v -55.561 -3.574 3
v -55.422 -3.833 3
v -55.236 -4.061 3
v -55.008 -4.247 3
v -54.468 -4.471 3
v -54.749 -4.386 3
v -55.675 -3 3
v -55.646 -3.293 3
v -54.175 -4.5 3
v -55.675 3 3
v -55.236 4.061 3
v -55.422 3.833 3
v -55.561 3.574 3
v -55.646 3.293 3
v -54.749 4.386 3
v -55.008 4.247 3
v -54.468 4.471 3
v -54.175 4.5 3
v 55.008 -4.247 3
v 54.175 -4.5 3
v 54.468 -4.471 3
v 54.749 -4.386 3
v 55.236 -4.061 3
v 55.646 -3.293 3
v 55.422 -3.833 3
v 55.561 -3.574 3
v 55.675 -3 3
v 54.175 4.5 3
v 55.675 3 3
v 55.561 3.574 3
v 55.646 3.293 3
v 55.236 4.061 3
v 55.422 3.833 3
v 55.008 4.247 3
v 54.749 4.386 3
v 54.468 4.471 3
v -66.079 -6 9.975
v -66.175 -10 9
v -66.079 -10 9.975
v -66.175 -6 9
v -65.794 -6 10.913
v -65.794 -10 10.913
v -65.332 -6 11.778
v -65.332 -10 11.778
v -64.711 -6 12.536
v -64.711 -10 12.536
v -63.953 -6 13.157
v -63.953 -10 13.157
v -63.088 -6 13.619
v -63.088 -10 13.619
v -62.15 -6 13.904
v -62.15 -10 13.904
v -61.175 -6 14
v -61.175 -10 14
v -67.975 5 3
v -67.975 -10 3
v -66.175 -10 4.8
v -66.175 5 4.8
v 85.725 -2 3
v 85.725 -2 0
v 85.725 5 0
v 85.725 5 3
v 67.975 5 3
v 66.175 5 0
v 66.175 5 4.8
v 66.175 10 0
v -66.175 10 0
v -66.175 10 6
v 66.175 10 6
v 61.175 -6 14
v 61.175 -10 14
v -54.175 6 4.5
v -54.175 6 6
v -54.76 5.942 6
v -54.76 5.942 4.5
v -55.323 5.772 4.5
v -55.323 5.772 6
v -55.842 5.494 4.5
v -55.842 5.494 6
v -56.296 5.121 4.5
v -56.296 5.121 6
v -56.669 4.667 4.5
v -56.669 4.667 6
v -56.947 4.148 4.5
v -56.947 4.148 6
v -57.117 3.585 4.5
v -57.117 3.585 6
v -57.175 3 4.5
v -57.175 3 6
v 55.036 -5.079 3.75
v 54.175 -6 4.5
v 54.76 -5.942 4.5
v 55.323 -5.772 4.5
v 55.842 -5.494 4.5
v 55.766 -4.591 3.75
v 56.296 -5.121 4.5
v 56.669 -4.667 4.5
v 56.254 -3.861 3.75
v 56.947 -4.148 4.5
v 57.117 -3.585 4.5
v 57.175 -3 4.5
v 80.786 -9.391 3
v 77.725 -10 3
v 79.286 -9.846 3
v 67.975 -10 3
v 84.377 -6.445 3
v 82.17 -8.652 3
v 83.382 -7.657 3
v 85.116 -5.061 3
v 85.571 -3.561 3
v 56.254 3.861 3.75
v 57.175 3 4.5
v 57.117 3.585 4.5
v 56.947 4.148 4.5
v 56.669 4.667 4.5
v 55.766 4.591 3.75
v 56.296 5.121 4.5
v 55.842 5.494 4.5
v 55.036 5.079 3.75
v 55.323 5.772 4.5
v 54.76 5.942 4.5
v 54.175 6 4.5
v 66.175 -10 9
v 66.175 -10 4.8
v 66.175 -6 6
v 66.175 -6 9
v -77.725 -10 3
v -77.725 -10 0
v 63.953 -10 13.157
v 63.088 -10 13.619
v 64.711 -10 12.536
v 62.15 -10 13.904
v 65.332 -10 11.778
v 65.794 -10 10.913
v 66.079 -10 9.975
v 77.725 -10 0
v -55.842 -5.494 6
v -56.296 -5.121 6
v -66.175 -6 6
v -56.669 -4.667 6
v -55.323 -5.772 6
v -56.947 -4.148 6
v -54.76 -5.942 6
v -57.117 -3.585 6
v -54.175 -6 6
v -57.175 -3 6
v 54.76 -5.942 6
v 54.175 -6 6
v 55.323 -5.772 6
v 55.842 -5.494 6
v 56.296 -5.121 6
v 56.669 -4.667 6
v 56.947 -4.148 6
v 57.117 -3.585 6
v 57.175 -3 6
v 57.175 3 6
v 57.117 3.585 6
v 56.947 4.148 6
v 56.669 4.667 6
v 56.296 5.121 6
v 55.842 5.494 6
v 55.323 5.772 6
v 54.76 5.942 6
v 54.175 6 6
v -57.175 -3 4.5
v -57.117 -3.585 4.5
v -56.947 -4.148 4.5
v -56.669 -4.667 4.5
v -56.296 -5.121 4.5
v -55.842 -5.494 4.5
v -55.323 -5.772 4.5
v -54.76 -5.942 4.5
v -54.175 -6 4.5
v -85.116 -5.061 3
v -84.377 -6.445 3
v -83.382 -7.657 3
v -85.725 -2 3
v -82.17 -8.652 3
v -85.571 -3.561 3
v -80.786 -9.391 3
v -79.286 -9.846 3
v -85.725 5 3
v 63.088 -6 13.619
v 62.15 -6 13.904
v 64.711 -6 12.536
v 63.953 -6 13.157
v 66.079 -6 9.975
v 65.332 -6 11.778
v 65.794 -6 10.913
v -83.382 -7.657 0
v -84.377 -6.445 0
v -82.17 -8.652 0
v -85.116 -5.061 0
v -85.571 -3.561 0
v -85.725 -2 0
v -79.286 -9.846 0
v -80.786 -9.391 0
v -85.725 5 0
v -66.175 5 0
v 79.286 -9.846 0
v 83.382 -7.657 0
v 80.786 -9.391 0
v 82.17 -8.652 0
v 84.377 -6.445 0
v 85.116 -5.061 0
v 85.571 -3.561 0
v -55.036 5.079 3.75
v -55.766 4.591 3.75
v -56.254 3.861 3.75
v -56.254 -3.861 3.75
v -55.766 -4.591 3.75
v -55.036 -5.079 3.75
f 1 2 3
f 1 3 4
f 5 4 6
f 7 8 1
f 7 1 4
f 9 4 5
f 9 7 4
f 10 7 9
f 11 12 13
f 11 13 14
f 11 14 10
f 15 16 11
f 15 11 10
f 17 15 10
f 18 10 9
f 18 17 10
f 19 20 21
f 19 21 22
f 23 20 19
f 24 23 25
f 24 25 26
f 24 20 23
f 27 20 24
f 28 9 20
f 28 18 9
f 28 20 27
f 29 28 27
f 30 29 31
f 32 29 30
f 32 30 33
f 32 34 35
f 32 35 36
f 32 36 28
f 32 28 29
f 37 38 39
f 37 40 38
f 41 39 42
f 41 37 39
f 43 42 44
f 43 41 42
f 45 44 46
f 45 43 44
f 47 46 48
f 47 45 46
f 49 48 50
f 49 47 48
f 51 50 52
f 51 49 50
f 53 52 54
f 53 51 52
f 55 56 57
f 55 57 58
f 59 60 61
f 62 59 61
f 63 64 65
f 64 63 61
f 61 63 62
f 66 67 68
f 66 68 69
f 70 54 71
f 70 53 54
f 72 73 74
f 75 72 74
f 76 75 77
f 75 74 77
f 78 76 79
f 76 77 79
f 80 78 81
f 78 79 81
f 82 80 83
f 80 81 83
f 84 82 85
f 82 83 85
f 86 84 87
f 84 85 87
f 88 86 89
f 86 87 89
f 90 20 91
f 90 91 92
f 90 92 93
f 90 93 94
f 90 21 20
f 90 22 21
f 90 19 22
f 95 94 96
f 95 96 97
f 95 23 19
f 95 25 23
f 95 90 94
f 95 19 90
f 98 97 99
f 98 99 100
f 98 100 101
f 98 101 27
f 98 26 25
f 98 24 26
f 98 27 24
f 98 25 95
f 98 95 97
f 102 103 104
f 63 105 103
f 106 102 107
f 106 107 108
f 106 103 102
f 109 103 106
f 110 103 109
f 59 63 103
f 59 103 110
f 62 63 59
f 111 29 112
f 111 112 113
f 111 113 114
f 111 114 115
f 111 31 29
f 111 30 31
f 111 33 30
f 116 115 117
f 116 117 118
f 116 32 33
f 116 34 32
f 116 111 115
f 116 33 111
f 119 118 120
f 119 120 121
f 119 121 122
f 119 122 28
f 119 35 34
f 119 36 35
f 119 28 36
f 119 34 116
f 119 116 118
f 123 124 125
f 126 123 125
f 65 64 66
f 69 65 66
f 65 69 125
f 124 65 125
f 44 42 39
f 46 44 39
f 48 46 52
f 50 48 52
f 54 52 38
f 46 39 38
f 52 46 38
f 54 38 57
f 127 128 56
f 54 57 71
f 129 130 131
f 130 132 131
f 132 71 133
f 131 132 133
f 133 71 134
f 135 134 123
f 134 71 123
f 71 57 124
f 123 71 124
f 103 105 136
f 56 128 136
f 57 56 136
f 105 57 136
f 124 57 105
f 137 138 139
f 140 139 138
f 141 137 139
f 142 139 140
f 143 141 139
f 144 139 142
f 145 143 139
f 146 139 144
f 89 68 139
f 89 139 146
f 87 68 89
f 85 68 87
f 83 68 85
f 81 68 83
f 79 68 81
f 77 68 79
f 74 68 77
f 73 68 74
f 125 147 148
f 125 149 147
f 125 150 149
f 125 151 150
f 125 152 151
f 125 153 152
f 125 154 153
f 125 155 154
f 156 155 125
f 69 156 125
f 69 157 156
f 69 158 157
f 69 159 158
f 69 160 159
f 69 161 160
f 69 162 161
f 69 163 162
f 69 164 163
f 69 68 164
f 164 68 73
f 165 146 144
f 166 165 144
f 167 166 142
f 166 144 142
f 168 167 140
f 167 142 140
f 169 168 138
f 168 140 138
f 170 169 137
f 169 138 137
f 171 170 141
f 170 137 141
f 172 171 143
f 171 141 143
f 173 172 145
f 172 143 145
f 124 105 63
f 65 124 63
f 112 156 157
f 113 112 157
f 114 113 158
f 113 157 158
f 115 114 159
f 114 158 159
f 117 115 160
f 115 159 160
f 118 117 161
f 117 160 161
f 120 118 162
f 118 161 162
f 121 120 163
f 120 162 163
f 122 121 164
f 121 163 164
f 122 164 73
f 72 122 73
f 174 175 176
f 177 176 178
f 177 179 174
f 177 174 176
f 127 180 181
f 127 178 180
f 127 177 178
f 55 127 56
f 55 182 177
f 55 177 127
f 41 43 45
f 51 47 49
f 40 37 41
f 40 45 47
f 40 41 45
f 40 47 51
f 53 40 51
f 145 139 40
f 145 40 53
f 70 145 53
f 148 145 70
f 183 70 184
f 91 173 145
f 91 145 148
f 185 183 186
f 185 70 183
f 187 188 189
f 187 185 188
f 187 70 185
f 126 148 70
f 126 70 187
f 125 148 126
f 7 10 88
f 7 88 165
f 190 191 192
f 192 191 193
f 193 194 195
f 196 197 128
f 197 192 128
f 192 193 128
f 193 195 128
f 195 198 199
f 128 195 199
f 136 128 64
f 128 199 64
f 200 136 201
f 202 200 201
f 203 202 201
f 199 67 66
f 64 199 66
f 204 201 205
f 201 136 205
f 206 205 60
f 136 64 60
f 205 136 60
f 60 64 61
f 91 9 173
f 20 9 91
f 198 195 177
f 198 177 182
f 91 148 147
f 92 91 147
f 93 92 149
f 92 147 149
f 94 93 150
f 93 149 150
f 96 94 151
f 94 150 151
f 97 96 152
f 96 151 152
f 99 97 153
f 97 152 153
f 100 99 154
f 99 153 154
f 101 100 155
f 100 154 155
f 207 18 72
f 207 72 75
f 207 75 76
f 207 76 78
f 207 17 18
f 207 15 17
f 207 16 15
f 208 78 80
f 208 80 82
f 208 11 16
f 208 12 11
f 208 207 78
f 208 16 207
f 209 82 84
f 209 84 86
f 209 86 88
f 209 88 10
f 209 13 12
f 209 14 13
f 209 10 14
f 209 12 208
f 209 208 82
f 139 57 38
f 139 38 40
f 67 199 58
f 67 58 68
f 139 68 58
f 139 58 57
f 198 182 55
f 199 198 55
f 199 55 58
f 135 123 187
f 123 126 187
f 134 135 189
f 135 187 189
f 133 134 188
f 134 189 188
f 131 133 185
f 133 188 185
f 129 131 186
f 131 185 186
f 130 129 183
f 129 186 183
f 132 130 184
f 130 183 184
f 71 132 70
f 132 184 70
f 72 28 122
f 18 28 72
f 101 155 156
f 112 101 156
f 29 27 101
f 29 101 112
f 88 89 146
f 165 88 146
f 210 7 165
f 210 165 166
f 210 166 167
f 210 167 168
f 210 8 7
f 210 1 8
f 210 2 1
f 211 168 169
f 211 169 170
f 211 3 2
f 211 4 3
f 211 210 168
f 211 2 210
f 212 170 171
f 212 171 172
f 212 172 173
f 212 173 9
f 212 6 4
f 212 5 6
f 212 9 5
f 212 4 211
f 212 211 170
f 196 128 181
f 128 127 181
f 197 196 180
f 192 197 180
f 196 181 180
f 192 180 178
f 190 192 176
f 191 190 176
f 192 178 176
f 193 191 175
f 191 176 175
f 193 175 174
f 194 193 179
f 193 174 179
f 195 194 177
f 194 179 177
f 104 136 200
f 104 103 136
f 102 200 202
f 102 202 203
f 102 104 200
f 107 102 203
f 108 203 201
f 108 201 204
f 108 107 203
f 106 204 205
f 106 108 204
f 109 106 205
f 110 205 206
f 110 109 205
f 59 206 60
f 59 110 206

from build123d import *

# Parameters (mm, degrees)
SKETCH1_W           = 171.45
SKETCH1_H           = 20
BOSS_EXTRUDE1_DEPTH = 6
SKETCH2_W           = 19.55
SKETCH2_H           = 15
CUT_EXTRUDE1_DEPTH  = 3
SKETCH3_W           = 19.55
SKETCH3_H           = 5
CUT_EXTRUDE2_DEPTH  = 13
CHAMFER1_SIZE       = 1.8
SKETCH4_W           = 132.35
SKETCH4_H           = 4
BOSS_EXTRUDE2_DEPTH = 8
CUT_EXTRUDE3_DEPTH  = 3
CHAMFER2_SIZE       = 1.5
FILLET1_R           = 8
FILLET2_R           = 5


with BuildPart() as part:
    # Sketch1 → Boss-Extrude1 (new body)
    with BuildSketch(Plane.XY):
        Rectangle(SKETCH1_W, SKETCH1_H)
    extrude(amount=BOSS_EXTRUDE1_DEPTH)

    # Sketch2 → Cut-Extrude1 (cut)
    with BuildSketch(Plane.XY.offset(6)):
        with Locations((-75.95, -2.5)):
            Rectangle(SKETCH2_W, SKETCH2_H)
        with Locations((75.95, -2.5)):
            Rectangle(SKETCH2_W, SKETCH2_H)
    extrude(amount=-CUT_EXTRUDE1_DEPTH, mode=Mode.SUBTRACT)

    # Sketch3 → Cut-Extrude2 (cut)
    with BuildSketch(Plane.XY.offset(6)):
        with Locations((-75.95, 7.5)):
            Rectangle(SKETCH3_W, SKETCH3_H)
        with Locations((75.95, 7.5)):
            Rectangle(SKETCH3_W, SKETCH3_H)
    extrude(amount=-CUT_EXTRUDE2_DEPTH, mode=Mode.SUBTRACT)

    # Chamfer1
    chamfer1_edges = [part.edges().sort_by_distance(p)[0] for p in [
        (-66.175, -2.5, 3),
        (66.175, -2.5, 3),
    ]]
    chamfer(chamfer1_edges, length=CHAMFER1_SIZE)

    # Sketch4 → Boss-Extrude2 (add)
    with BuildSketch(Plane.XY.offset(6)):
        with Locations((0, -8)):
            Rectangle(SKETCH4_W, SKETCH4_H)
    extrude(amount=BOSS_EXTRUDE2_DEPTH)

    # Sketch5 → Cut-Extrude3 (cut)
    with BuildSketch(Plane.XY.offset(6)):
        with BuildLine():
            Line((-54.175, -6), (54.175, -6))
            ThreePointArc((54.175, -6), (56.296320344, -5.121320344), (57.175, -3))
            Line((57.175, -3), (57.175, 3))
            ThreePointArc((57.175, 3), (56.296320344, 5.121320344), (54.175, 6))
            Line((54.175, 6), (-54.175, 6))
            ThreePointArc((-54.175, 6), (-56.296320344, 5.121320344), (-57.175, 3))
            Line((-57.175, 3), (-57.175, -3))
            ThreePointArc((-57.175, -3), (-56.296320344, -5.121320344), (-54.175, -6))
        make_face()
    extrude(amount=-CUT_EXTRUDE3_DEPTH, mode=Mode.SUBTRACT)

    # Chamfer2
    chamfer2_edges = [part.edges().sort_by_distance(p)[0] for p in [
        (56.296320344, -5.121320344, 3),
        (0, -6, 3),
        (-56.296320344, -5.121320344, 3),
        (-57.175, 0, 3),
        (-56.296320344, 5.121320344, 3),
        (0, 6, 3),
        (56.296320344, 5.121320344, 3),
        (57.175, 0, 3),
    ]]
    chamfer(chamfer2_edges, length=CHAMFER2_SIZE)

    # Fillet1
    fillet1_edges = [part.edges().sort_by_distance(p)[0] for p in [
        (-85.725, -10, 1.5),
        (85.725, -10, 1.5),
    ]]
    fillet(fillet1_edges, radius=FILLET1_R)

    # Fillet2
    fillet2_edges = [part.edges().sort_by_distance(p)[0] for p in [
        (-66.175, -8, 14),
        (66.175, -8, 14),
    ]]
    fillet(fillet2_edges, radius=FILLET2_R)


solid = part.part
